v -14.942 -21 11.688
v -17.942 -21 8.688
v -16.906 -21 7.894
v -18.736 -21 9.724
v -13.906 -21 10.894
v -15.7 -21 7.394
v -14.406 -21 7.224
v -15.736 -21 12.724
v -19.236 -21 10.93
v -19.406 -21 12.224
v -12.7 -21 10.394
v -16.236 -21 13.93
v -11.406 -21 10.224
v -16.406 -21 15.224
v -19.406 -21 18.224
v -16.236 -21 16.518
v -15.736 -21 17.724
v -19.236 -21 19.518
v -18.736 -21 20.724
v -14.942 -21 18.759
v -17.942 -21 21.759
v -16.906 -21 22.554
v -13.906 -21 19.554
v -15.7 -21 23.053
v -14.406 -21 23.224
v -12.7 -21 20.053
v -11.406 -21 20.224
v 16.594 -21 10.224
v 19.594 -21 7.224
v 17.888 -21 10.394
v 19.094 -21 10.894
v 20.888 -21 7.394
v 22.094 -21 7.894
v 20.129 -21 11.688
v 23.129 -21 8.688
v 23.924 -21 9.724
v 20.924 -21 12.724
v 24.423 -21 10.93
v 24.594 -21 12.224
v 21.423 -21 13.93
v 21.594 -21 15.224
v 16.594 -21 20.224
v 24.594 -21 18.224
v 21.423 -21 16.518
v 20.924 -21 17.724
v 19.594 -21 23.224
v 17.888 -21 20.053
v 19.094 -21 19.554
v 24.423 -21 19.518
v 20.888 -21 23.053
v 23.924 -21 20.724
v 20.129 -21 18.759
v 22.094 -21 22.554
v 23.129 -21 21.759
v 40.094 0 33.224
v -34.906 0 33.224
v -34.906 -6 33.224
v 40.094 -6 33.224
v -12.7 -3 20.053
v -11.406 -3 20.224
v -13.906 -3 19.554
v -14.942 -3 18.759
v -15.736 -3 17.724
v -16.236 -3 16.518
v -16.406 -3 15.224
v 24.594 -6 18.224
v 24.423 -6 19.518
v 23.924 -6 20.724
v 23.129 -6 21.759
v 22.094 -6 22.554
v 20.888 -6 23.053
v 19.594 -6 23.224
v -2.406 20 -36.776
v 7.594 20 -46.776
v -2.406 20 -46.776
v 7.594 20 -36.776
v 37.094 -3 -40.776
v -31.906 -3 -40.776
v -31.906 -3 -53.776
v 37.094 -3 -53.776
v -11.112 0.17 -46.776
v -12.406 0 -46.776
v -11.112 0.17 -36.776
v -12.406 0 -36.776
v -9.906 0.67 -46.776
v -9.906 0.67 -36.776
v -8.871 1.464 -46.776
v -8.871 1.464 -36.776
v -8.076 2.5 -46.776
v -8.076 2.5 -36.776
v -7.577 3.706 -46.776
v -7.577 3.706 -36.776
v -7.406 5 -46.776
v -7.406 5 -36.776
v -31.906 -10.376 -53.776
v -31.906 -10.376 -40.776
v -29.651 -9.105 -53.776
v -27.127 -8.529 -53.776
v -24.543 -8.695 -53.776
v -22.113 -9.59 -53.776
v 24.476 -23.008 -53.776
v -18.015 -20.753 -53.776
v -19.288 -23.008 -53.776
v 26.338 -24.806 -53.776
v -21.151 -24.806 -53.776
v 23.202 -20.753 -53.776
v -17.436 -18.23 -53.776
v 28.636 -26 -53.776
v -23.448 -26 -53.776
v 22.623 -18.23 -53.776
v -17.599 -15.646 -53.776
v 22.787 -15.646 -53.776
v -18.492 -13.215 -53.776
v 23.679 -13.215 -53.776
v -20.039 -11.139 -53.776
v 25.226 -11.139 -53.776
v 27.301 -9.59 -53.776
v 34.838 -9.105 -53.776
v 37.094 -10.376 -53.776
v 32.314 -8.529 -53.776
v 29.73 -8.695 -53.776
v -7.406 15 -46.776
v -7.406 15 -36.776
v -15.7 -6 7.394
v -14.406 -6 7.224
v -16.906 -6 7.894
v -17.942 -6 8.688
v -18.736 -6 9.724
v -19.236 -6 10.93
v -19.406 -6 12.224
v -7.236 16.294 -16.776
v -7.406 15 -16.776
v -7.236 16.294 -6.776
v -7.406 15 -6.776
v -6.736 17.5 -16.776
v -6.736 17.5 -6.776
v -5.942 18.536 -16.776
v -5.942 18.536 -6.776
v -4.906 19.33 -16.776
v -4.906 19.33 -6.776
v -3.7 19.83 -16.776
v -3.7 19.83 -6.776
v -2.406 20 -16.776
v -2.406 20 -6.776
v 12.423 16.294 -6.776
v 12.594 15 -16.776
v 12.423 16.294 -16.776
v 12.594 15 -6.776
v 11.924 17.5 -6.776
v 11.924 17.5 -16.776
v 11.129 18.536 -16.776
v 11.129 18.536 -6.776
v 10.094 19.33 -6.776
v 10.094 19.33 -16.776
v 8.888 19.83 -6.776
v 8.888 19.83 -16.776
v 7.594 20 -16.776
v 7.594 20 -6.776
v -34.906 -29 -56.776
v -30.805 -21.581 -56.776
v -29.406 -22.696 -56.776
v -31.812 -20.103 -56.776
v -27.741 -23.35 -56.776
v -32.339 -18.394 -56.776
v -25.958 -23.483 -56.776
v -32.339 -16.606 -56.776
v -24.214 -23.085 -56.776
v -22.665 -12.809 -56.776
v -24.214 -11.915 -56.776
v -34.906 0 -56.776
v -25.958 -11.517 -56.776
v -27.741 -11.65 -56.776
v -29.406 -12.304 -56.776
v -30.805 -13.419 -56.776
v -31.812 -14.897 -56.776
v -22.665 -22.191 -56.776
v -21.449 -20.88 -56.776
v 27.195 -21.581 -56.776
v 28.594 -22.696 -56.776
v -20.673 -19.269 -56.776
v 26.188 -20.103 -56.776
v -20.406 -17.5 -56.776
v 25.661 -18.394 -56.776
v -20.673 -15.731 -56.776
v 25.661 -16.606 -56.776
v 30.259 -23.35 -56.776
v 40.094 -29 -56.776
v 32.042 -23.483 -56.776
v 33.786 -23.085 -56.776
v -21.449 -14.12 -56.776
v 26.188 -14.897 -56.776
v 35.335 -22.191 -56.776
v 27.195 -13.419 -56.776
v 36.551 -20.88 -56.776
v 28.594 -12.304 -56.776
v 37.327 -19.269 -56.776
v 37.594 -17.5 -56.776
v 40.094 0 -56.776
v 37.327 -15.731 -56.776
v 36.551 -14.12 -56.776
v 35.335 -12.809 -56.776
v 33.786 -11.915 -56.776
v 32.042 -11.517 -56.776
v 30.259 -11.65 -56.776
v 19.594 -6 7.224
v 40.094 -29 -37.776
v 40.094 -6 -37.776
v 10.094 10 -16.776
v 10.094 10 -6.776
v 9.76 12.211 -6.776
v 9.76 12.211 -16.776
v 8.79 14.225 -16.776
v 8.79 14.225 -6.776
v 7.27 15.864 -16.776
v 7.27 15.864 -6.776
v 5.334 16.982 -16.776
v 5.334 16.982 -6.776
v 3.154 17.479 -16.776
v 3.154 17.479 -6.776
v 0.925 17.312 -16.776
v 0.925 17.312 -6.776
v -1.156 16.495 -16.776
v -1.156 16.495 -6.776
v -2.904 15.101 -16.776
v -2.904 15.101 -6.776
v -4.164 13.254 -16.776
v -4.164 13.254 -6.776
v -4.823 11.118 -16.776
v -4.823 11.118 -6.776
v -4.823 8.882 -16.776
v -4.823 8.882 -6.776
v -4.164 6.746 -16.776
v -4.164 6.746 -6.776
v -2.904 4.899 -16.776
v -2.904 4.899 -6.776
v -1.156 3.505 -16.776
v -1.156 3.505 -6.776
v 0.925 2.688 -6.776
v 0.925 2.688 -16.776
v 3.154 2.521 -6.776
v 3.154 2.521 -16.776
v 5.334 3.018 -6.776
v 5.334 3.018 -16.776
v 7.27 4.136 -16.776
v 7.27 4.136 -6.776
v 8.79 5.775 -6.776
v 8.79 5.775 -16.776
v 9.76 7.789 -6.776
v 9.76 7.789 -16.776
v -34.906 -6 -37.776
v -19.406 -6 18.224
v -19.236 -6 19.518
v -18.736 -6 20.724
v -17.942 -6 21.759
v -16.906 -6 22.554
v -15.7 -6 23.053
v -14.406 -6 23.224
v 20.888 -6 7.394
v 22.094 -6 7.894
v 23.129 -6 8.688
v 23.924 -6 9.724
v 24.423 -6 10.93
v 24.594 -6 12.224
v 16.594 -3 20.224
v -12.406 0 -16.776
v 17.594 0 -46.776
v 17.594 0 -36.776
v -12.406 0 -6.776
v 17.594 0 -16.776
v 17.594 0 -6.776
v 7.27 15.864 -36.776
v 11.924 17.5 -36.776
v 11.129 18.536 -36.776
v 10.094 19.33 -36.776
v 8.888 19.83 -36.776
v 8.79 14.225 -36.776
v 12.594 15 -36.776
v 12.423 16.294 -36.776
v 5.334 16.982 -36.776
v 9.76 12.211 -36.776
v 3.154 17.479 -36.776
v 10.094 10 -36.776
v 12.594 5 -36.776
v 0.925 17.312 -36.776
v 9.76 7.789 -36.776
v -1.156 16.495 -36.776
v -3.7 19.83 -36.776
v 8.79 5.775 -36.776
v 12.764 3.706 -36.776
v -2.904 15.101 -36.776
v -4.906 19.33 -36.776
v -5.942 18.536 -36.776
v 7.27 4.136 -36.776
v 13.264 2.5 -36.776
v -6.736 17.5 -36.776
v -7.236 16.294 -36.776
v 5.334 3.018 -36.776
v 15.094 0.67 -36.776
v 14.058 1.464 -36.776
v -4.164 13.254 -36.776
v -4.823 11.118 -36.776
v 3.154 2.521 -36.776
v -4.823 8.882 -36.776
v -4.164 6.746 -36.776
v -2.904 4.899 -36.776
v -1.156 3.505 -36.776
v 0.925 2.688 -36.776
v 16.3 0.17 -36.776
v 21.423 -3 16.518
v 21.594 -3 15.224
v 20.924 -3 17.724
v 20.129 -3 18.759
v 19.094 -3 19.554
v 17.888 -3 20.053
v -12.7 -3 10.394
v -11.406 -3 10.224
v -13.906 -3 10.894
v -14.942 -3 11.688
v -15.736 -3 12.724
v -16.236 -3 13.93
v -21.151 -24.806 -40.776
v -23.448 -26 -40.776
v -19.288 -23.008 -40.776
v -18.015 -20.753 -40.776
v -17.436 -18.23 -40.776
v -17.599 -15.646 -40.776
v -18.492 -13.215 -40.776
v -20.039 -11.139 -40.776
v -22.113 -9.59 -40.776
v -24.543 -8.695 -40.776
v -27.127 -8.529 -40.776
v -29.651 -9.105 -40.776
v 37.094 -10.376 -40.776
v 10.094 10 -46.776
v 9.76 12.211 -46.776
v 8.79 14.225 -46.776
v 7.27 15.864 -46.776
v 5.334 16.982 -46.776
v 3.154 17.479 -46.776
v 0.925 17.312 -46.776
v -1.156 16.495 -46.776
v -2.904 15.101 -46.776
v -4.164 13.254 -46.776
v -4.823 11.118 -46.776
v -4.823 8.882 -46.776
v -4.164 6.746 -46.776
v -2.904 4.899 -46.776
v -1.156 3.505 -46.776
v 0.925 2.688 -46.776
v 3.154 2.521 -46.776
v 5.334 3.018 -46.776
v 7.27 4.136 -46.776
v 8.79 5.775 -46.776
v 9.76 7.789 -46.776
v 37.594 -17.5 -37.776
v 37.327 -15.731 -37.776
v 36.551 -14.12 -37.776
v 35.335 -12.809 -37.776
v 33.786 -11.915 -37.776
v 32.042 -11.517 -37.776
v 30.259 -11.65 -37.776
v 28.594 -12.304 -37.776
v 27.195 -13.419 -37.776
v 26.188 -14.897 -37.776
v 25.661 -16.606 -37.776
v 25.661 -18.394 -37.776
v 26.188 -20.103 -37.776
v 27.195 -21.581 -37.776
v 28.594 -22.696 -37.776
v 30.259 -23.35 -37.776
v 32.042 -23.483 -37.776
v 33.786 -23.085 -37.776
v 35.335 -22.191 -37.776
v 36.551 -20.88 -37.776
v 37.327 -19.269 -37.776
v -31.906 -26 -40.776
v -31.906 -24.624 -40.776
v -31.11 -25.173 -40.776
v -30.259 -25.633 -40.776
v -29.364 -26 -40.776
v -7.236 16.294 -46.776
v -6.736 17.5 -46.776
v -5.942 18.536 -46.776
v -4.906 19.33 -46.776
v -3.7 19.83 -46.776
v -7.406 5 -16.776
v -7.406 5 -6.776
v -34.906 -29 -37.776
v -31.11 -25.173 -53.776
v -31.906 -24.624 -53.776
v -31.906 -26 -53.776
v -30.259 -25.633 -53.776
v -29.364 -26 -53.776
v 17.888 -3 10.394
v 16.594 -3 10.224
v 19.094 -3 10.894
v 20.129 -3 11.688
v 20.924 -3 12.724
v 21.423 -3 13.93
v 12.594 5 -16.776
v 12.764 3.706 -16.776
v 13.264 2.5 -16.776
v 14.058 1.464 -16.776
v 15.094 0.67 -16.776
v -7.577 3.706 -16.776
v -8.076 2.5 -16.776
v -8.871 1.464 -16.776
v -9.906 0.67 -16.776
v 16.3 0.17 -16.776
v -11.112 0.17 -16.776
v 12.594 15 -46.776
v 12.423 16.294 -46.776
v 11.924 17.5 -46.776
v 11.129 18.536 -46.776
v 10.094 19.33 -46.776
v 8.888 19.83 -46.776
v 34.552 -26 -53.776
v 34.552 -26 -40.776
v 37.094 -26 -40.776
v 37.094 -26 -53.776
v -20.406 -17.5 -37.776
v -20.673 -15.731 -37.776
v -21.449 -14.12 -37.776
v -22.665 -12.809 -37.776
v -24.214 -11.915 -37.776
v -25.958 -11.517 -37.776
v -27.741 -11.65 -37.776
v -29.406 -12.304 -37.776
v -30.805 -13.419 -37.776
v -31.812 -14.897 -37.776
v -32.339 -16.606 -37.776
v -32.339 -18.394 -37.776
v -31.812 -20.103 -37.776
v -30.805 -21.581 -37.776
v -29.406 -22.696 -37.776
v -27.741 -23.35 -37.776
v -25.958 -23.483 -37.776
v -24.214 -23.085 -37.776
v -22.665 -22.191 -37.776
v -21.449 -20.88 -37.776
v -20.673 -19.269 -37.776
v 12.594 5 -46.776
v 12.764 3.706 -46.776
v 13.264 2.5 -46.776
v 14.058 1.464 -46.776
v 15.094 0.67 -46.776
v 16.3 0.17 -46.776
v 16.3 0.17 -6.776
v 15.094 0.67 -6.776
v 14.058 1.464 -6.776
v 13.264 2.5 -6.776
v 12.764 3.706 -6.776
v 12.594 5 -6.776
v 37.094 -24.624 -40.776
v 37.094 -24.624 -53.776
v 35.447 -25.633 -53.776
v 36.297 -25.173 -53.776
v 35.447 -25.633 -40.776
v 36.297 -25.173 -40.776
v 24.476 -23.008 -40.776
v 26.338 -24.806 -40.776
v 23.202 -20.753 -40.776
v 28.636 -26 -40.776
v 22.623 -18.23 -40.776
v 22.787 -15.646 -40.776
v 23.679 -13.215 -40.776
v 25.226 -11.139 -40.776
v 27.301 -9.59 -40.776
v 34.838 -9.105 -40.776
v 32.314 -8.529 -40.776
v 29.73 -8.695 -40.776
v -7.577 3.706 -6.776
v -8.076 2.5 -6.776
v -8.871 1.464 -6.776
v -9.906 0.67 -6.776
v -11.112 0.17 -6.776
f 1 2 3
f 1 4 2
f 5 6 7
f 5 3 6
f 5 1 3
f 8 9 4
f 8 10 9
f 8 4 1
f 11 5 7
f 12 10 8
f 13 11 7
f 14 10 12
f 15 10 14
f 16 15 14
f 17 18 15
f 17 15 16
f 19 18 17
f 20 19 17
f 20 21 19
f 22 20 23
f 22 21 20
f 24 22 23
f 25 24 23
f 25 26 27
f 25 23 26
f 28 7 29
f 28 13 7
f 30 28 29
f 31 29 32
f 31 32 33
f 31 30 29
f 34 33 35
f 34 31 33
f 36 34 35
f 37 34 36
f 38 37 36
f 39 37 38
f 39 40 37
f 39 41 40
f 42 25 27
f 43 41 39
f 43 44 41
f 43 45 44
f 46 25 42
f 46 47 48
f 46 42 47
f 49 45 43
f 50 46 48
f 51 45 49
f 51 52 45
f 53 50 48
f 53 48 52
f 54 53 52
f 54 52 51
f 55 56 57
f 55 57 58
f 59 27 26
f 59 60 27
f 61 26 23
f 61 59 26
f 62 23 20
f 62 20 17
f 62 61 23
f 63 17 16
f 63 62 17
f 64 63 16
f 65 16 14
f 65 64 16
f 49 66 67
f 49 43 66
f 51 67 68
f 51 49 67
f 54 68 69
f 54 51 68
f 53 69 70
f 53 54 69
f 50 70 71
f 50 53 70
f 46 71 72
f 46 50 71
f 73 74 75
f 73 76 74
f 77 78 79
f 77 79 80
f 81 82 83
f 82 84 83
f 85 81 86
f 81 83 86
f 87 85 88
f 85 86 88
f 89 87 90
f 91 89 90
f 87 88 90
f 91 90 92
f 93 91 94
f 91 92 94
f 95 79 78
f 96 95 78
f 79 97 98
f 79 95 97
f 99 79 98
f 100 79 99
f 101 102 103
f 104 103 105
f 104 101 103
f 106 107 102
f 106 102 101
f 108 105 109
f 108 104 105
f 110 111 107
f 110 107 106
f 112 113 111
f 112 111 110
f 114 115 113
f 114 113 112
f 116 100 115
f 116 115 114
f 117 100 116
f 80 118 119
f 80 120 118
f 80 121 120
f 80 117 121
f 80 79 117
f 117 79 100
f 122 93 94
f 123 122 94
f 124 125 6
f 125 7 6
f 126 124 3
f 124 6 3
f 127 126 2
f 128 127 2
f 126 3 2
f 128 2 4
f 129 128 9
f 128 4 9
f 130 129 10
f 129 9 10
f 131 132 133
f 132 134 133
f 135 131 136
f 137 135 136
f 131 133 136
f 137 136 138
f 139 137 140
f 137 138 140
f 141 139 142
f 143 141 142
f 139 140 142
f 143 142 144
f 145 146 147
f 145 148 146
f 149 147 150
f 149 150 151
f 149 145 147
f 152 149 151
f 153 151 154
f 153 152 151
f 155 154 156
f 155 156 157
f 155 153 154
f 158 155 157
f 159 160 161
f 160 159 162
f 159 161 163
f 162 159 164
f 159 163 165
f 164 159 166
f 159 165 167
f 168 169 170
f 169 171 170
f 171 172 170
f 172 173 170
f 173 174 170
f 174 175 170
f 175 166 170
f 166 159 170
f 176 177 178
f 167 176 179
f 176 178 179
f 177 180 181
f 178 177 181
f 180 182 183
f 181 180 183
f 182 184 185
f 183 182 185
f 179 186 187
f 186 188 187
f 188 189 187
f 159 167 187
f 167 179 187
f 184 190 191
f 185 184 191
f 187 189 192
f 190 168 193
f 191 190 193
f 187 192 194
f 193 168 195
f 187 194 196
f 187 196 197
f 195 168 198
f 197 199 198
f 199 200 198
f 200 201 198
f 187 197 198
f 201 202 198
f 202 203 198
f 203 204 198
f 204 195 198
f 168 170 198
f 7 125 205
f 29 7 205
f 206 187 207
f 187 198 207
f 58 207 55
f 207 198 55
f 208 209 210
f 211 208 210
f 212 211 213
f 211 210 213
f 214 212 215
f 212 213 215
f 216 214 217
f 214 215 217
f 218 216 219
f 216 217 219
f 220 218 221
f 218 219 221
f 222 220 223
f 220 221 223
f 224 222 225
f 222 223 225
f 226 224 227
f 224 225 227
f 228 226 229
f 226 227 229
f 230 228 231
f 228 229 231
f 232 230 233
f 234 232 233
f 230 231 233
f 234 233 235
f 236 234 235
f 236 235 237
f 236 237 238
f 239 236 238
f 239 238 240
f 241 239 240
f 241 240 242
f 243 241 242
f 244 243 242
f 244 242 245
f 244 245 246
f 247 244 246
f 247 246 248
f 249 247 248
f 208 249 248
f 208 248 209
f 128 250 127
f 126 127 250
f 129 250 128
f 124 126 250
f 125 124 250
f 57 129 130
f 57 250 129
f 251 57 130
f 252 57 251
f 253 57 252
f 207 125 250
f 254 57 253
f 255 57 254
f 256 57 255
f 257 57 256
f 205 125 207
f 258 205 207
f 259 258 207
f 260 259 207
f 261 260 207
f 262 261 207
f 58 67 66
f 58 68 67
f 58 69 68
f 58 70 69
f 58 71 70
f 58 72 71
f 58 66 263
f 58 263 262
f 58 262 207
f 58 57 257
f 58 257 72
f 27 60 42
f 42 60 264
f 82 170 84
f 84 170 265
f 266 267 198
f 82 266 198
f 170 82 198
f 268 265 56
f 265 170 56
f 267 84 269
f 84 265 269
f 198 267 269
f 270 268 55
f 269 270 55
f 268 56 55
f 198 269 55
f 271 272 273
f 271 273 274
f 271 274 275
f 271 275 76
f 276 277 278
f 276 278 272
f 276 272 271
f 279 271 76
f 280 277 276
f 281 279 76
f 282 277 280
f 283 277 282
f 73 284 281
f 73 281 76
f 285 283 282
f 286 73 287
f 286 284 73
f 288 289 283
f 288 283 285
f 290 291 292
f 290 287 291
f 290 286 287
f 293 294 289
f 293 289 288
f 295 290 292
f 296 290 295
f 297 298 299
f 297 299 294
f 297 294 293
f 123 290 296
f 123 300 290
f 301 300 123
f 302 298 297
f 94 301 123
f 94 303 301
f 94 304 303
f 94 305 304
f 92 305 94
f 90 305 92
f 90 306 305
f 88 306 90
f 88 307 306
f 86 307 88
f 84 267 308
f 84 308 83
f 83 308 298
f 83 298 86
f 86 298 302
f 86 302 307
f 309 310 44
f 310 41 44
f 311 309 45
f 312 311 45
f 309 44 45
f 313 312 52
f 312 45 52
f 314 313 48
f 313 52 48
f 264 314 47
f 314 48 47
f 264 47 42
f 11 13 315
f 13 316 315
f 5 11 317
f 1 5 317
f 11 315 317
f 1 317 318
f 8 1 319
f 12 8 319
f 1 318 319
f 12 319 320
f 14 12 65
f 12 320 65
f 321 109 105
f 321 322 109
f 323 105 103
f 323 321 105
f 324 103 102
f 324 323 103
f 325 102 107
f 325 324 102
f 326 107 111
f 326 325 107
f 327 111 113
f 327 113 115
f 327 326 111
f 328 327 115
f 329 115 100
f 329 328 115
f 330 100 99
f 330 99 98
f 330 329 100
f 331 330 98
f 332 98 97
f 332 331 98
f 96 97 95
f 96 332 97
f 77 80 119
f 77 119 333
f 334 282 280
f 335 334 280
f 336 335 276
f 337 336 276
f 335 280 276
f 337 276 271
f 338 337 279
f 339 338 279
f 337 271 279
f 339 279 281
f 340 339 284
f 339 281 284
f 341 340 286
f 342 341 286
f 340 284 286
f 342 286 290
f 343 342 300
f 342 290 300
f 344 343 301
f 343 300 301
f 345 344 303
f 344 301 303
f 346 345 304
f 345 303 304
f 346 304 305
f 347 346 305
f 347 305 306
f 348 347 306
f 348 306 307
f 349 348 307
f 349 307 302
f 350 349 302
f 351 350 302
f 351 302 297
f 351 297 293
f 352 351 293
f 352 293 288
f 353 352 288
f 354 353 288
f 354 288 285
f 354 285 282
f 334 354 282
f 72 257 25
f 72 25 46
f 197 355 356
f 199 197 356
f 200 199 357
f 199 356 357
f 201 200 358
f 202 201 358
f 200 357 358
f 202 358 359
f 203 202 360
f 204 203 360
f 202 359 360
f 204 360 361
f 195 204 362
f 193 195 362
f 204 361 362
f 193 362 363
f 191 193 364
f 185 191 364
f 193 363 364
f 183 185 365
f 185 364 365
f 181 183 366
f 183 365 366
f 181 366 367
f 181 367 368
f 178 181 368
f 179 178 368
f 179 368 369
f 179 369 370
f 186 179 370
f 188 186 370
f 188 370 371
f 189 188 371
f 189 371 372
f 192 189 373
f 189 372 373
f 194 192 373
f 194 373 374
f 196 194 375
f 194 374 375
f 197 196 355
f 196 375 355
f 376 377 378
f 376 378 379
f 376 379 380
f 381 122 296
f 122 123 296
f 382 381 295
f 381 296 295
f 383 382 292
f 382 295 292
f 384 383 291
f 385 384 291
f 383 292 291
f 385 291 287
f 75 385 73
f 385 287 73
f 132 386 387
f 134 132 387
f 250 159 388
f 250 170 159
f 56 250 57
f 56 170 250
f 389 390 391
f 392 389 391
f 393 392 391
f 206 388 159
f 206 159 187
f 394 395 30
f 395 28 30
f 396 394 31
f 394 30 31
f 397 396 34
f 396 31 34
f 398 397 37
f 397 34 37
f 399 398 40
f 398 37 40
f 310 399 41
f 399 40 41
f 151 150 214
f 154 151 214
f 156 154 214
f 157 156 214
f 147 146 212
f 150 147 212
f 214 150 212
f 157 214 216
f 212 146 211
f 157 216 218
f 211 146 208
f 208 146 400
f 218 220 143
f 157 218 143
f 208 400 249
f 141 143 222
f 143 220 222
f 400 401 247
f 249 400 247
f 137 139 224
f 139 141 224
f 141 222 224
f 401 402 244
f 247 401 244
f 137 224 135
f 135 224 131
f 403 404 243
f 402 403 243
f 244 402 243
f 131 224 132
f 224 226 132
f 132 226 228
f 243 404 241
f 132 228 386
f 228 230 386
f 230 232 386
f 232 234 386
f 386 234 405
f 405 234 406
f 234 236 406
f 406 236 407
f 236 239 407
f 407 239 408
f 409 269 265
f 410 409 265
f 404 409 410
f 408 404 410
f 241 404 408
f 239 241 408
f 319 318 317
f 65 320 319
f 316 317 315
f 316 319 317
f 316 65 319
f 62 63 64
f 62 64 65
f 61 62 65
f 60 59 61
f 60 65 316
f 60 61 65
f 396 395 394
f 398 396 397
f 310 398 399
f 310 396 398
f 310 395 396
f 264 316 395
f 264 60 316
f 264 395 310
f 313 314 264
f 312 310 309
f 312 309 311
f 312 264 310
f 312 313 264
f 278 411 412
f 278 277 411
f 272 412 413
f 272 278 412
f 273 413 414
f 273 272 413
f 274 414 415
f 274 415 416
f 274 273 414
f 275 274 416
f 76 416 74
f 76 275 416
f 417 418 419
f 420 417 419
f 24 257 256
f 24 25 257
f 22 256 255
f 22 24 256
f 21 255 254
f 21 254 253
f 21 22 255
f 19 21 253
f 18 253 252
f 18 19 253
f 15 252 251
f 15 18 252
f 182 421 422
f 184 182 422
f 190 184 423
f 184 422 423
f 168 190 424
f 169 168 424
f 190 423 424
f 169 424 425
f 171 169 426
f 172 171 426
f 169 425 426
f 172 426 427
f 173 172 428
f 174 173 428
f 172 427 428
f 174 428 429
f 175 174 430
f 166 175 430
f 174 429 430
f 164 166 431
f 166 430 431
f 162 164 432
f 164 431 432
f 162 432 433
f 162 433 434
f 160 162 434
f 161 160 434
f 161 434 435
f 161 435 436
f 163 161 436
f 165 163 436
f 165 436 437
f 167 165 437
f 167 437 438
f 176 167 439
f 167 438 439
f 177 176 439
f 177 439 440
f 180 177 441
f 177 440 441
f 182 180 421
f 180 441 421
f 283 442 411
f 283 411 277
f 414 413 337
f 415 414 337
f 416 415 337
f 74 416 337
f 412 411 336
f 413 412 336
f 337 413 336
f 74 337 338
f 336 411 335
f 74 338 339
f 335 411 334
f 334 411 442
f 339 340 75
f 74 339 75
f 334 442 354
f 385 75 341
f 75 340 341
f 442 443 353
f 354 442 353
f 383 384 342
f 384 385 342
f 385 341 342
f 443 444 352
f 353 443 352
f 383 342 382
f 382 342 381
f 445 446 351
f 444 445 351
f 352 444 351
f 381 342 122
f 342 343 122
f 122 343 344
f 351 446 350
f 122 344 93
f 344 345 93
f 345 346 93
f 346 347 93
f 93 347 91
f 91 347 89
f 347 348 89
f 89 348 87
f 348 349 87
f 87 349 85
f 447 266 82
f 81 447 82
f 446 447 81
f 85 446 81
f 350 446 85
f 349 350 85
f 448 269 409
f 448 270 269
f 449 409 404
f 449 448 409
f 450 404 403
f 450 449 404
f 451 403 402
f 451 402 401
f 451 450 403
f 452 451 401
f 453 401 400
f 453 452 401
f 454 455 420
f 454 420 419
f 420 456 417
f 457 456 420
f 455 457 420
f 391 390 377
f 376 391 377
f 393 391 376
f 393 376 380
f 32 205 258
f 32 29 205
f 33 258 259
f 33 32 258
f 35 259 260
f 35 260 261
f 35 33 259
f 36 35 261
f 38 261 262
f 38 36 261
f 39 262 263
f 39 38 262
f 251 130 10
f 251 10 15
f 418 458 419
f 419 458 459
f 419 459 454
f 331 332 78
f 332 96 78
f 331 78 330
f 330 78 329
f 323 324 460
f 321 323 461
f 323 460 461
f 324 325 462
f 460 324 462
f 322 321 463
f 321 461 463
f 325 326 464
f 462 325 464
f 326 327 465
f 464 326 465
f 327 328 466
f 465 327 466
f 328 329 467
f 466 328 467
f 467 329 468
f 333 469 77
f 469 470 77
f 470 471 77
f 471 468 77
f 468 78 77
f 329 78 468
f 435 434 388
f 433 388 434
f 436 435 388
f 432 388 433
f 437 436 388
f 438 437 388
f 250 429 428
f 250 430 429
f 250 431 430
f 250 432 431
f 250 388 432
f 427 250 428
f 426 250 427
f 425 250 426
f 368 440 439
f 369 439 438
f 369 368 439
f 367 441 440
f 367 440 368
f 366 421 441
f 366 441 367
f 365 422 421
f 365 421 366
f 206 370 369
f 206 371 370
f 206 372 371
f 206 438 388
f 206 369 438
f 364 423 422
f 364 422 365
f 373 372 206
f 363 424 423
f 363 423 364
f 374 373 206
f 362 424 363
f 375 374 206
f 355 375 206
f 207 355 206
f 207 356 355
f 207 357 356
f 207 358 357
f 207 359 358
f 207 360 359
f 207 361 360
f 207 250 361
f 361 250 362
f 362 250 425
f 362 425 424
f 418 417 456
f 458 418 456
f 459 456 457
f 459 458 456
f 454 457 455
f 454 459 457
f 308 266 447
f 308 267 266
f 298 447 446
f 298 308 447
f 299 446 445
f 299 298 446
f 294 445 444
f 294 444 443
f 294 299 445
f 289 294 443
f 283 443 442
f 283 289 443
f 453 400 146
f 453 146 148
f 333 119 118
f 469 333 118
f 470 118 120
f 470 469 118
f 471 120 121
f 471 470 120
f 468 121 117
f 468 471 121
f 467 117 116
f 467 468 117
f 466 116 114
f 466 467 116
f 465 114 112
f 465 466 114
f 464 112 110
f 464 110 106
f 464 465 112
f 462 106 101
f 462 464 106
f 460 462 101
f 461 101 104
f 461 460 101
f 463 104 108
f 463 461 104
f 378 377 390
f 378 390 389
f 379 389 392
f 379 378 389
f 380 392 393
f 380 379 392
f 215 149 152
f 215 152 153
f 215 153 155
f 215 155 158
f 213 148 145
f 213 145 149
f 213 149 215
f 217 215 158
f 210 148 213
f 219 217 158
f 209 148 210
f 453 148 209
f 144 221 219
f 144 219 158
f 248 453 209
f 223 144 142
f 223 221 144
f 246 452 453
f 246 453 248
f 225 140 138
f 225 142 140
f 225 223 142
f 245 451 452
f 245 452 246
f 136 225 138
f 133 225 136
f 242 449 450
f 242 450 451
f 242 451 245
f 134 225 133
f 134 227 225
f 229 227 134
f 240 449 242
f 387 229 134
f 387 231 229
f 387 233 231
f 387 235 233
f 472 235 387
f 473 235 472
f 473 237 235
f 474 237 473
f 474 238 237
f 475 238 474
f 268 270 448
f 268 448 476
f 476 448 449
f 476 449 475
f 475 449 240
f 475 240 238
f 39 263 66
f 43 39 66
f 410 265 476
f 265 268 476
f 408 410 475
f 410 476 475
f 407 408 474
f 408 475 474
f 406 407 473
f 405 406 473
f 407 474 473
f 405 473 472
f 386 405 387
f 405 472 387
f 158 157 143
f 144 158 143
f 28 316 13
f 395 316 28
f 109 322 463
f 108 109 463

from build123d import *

# Parameters (mm, degrees)
F1_W        = 75
F1_H        = 90
F2_DEPTH    = 6
F3_W        = 75
F3_H        = 19
F4_DEPTH    = 23
F5_R        = 6
F6_DEPTH    = 19
F7_W        = 44
F7_H        = 16
F8_DEPTH    = 15
F9_T        = 3
F9_T3_DEPTH = 81
F9_T5_DEPTH = 22
F9_T7_DEPTH = 50
F10_R       = 4.99999
F11_W       = 20
F11_H       = 10
F12_DEPTH   = 20
F13_R       = 7.5
F14_DEPTH   = 40
F15_R       = 5


# Not quite as in the source:
# - a fillet or chamfer is up to 0.001 mm smaller than in the source, because OpenCascade refuses the exact size
# - a shell that OpenCascade refuses in one call is made with other operations: the cavity is built on its own and cut out


with BuildPart() as f2:
    # F1 (on Front) → F2 (new body)
    with BuildSketch(Plane.XZ):
        with Locations((2.5936549902, -11.7762294412)):
            Rectangle(F1_W, F1_H)
    extrude(amount=F2_DEPTH)

    # F3 (on face) → F4 (join)
    with BuildSketch(Plane.XZ.offset(6)):
        with Locations((2.5936549902, -47.2762294412)):
            Rectangle(F3_W, F3_H)
    extrude(amount=F4_DEPTH)

    # F5 (on face) → F6 (cut, through all)
    with BuildSketch(Plane.XY.offset(-37.7762294412)):
        with Locations((-26.4063450098, -17.5)):
            Circle(F5_R)
        with Locations((31.5936549902, -17.5)):
            Circle(F5_R)
    extrude(amount=-F6_DEPTH, mode=Mode.SUBTRACT)

    # F7 (on face) → F8 (join)
    with BuildSketch(Plane.XZ.offset(6)):
        with Locations((2.5936549902, 15.2237705588)):
            Rectangle(F7_W, F7_H)
    extrude(amount=F8_DEPTH)

    # F9: shell of thickness 3, made by hand


with BuildPart() as f9_core1:
    # F9_t2: copy of F2
    add(f2.part)

    # the walls: a layer under each face that stays
    f9_faces = [f9_core1.faces().sort_by_distance(p)[0] for p in [
        (40.0936549902, -24.1666666667, -41.7762294412),
        (2.5936549902, -14.5, -56.7762294412),
        (2.5936549902, -29, -47.2762294412),
        (2.5936549902, -17.5, -37.7762294412),
        (2.5936549902, -6, -2.2762294412),
        (2.5936549902, -3, 33.2237705588),
        (2.5936549902, 0, -11.7762294412),
        (-34.9063450098, -4.8333333333, 18.2237705588),
        (-32.4063450098, -17.5, -47.2762294412),
        (25.5936549902, -17.5, -47.2762294412),
        (24.5936549902, -13.5, 15.2237705588),
        (2.5936549902, -13.5, 23.2237705588),
        (-19.4063450098, -13.5, 15.2237705588),
        (2.5936549902, -13.5, 7.2237705588),
    ]]
    thicken(f9_faces, amount=-F9_T, mode=Mode.SUBTRACT)

    # F9_s4 → F9_t3 (cut)
    with BuildSketch(Plane.YZ.offset(-37.9063450098)):
        Polygon((-6.03, -37.7462294412), (-6, -40.7762294412), (-3, -40.7762294412), (-3, -37.7762294412), align=None)
    extrude(amount=F9_T3_DEPTH, mode=Mode.SUBTRACT)

    # F9_s6 → F9_t5 (cut)
    with BuildSketch(Plane.XY.offset(4.2237705588)):
        Polygon((24.6236549902, -6.03), (24.5936549902, -3), (21.5936549902, -3), (21.5936549902, -6), align=None)
        Polygon((-19.4363450098, -6.03), (-19.4063450098, -3), (-16.4063450098, -3), (-16.4063450098, -6), align=None)
    extrude(amount=F9_T5_DEPTH, mode=Mode.SUBTRACT)

    # F9_s8 → F9_t7 (cut)
    with BuildSketch(Plane.YZ.offset(-22.4063450098)):
        Polygon((-6.03, 23.2537705588), (-3, 23.2237705588), (-3, 20.2237705588), (-6, 20.2237705588), align=None)
        Polygon((-6.03, 7.1937705588), (-3, 7.2237705588), (-3, 10.2237705588), (-6, 10.2237705588), align=None)
    extrude(amount=F9_T7_DEPTH, mode=Mode.SUBTRACT)


with BuildPart() as f2_1:
    add(f2.part)

    # what is left inside the walls is the cavity
    f9_cavity = [f9_core1.part.solids().sort_by_distance(p)[0] for p in [
        (35.892563, -25.441051, -49.442896),
        (-30.705253, -25.441051, -49.442896),
        (2.593655, -18.333333, -40.806229),
        (2.593655, -15, 10.253771),
    ]]
    add(f9_cavity, mode=Mode.SUBTRACT)

    # F10 (radius 5 in the source; OpenCascade refuses exactly that, so slightly less here)
    f10_edges = [f2_1.edges().sort_by_distance(p)[0] for p in [
        (-19.406345, -13.5, 23.223771),
        (-16.406345, -13.5, 20.223771),
        (-16.406345, -13.5, 10.223771),
        (-19.406345, -13.5, 7.223771),
        (21.593655, -13.5, 20.223771),
        (21.593655, -13.5, 10.223771),
        (24.593655, -13.5, 7.223771),
        (24.593655, -13.5, 23.223771),
    ]]
    fillet(f10_edges, radius=F10_R)

    # F11 (on face) → F12 (join)
    with BuildSketch(Plane(origin=(0, 0, 0), x_dir=(-1, 0, 0), z_dir=(0, 1, 0))):
        with Locations((-2.5936549902, -11.7762294412)):
            Rectangle(F11_W, F11_H)
        with Locations((-2.5936549902, -41.7762294412)):
            Rectangle(F11_W, F11_H)
    extrude(amount=F12_DEPTH)

    # F13 (on face) → F14 (cut, through all)
    with BuildSketch(Plane.XY.offset(-6.7762294412)):
        with Locations((2.5936549902, 10)):
            Circle(F13_R)
    extrude(amount=-F14_DEPTH, mode=Mode.SUBTRACT)

    # F15
    f15_edges = [f2_1.edges().sort_by_distance(p)[0] for p in [
        (12.593655, 20, -11.776229),
        (-7.406345, 20, -11.776229),
        (-7.406345, 0, -11.776229),
        (12.593655, 0, -11.776229),
        (12.593655, 0, -41.776229),
        (12.593655, 20, -41.776229),
        (-7.406345, 0, -41.776229),
        (-7.406345, 20, -41.776229),
    ]]
    fillet(f15_edges, radius=F15_R)


solid = f2_1.part
